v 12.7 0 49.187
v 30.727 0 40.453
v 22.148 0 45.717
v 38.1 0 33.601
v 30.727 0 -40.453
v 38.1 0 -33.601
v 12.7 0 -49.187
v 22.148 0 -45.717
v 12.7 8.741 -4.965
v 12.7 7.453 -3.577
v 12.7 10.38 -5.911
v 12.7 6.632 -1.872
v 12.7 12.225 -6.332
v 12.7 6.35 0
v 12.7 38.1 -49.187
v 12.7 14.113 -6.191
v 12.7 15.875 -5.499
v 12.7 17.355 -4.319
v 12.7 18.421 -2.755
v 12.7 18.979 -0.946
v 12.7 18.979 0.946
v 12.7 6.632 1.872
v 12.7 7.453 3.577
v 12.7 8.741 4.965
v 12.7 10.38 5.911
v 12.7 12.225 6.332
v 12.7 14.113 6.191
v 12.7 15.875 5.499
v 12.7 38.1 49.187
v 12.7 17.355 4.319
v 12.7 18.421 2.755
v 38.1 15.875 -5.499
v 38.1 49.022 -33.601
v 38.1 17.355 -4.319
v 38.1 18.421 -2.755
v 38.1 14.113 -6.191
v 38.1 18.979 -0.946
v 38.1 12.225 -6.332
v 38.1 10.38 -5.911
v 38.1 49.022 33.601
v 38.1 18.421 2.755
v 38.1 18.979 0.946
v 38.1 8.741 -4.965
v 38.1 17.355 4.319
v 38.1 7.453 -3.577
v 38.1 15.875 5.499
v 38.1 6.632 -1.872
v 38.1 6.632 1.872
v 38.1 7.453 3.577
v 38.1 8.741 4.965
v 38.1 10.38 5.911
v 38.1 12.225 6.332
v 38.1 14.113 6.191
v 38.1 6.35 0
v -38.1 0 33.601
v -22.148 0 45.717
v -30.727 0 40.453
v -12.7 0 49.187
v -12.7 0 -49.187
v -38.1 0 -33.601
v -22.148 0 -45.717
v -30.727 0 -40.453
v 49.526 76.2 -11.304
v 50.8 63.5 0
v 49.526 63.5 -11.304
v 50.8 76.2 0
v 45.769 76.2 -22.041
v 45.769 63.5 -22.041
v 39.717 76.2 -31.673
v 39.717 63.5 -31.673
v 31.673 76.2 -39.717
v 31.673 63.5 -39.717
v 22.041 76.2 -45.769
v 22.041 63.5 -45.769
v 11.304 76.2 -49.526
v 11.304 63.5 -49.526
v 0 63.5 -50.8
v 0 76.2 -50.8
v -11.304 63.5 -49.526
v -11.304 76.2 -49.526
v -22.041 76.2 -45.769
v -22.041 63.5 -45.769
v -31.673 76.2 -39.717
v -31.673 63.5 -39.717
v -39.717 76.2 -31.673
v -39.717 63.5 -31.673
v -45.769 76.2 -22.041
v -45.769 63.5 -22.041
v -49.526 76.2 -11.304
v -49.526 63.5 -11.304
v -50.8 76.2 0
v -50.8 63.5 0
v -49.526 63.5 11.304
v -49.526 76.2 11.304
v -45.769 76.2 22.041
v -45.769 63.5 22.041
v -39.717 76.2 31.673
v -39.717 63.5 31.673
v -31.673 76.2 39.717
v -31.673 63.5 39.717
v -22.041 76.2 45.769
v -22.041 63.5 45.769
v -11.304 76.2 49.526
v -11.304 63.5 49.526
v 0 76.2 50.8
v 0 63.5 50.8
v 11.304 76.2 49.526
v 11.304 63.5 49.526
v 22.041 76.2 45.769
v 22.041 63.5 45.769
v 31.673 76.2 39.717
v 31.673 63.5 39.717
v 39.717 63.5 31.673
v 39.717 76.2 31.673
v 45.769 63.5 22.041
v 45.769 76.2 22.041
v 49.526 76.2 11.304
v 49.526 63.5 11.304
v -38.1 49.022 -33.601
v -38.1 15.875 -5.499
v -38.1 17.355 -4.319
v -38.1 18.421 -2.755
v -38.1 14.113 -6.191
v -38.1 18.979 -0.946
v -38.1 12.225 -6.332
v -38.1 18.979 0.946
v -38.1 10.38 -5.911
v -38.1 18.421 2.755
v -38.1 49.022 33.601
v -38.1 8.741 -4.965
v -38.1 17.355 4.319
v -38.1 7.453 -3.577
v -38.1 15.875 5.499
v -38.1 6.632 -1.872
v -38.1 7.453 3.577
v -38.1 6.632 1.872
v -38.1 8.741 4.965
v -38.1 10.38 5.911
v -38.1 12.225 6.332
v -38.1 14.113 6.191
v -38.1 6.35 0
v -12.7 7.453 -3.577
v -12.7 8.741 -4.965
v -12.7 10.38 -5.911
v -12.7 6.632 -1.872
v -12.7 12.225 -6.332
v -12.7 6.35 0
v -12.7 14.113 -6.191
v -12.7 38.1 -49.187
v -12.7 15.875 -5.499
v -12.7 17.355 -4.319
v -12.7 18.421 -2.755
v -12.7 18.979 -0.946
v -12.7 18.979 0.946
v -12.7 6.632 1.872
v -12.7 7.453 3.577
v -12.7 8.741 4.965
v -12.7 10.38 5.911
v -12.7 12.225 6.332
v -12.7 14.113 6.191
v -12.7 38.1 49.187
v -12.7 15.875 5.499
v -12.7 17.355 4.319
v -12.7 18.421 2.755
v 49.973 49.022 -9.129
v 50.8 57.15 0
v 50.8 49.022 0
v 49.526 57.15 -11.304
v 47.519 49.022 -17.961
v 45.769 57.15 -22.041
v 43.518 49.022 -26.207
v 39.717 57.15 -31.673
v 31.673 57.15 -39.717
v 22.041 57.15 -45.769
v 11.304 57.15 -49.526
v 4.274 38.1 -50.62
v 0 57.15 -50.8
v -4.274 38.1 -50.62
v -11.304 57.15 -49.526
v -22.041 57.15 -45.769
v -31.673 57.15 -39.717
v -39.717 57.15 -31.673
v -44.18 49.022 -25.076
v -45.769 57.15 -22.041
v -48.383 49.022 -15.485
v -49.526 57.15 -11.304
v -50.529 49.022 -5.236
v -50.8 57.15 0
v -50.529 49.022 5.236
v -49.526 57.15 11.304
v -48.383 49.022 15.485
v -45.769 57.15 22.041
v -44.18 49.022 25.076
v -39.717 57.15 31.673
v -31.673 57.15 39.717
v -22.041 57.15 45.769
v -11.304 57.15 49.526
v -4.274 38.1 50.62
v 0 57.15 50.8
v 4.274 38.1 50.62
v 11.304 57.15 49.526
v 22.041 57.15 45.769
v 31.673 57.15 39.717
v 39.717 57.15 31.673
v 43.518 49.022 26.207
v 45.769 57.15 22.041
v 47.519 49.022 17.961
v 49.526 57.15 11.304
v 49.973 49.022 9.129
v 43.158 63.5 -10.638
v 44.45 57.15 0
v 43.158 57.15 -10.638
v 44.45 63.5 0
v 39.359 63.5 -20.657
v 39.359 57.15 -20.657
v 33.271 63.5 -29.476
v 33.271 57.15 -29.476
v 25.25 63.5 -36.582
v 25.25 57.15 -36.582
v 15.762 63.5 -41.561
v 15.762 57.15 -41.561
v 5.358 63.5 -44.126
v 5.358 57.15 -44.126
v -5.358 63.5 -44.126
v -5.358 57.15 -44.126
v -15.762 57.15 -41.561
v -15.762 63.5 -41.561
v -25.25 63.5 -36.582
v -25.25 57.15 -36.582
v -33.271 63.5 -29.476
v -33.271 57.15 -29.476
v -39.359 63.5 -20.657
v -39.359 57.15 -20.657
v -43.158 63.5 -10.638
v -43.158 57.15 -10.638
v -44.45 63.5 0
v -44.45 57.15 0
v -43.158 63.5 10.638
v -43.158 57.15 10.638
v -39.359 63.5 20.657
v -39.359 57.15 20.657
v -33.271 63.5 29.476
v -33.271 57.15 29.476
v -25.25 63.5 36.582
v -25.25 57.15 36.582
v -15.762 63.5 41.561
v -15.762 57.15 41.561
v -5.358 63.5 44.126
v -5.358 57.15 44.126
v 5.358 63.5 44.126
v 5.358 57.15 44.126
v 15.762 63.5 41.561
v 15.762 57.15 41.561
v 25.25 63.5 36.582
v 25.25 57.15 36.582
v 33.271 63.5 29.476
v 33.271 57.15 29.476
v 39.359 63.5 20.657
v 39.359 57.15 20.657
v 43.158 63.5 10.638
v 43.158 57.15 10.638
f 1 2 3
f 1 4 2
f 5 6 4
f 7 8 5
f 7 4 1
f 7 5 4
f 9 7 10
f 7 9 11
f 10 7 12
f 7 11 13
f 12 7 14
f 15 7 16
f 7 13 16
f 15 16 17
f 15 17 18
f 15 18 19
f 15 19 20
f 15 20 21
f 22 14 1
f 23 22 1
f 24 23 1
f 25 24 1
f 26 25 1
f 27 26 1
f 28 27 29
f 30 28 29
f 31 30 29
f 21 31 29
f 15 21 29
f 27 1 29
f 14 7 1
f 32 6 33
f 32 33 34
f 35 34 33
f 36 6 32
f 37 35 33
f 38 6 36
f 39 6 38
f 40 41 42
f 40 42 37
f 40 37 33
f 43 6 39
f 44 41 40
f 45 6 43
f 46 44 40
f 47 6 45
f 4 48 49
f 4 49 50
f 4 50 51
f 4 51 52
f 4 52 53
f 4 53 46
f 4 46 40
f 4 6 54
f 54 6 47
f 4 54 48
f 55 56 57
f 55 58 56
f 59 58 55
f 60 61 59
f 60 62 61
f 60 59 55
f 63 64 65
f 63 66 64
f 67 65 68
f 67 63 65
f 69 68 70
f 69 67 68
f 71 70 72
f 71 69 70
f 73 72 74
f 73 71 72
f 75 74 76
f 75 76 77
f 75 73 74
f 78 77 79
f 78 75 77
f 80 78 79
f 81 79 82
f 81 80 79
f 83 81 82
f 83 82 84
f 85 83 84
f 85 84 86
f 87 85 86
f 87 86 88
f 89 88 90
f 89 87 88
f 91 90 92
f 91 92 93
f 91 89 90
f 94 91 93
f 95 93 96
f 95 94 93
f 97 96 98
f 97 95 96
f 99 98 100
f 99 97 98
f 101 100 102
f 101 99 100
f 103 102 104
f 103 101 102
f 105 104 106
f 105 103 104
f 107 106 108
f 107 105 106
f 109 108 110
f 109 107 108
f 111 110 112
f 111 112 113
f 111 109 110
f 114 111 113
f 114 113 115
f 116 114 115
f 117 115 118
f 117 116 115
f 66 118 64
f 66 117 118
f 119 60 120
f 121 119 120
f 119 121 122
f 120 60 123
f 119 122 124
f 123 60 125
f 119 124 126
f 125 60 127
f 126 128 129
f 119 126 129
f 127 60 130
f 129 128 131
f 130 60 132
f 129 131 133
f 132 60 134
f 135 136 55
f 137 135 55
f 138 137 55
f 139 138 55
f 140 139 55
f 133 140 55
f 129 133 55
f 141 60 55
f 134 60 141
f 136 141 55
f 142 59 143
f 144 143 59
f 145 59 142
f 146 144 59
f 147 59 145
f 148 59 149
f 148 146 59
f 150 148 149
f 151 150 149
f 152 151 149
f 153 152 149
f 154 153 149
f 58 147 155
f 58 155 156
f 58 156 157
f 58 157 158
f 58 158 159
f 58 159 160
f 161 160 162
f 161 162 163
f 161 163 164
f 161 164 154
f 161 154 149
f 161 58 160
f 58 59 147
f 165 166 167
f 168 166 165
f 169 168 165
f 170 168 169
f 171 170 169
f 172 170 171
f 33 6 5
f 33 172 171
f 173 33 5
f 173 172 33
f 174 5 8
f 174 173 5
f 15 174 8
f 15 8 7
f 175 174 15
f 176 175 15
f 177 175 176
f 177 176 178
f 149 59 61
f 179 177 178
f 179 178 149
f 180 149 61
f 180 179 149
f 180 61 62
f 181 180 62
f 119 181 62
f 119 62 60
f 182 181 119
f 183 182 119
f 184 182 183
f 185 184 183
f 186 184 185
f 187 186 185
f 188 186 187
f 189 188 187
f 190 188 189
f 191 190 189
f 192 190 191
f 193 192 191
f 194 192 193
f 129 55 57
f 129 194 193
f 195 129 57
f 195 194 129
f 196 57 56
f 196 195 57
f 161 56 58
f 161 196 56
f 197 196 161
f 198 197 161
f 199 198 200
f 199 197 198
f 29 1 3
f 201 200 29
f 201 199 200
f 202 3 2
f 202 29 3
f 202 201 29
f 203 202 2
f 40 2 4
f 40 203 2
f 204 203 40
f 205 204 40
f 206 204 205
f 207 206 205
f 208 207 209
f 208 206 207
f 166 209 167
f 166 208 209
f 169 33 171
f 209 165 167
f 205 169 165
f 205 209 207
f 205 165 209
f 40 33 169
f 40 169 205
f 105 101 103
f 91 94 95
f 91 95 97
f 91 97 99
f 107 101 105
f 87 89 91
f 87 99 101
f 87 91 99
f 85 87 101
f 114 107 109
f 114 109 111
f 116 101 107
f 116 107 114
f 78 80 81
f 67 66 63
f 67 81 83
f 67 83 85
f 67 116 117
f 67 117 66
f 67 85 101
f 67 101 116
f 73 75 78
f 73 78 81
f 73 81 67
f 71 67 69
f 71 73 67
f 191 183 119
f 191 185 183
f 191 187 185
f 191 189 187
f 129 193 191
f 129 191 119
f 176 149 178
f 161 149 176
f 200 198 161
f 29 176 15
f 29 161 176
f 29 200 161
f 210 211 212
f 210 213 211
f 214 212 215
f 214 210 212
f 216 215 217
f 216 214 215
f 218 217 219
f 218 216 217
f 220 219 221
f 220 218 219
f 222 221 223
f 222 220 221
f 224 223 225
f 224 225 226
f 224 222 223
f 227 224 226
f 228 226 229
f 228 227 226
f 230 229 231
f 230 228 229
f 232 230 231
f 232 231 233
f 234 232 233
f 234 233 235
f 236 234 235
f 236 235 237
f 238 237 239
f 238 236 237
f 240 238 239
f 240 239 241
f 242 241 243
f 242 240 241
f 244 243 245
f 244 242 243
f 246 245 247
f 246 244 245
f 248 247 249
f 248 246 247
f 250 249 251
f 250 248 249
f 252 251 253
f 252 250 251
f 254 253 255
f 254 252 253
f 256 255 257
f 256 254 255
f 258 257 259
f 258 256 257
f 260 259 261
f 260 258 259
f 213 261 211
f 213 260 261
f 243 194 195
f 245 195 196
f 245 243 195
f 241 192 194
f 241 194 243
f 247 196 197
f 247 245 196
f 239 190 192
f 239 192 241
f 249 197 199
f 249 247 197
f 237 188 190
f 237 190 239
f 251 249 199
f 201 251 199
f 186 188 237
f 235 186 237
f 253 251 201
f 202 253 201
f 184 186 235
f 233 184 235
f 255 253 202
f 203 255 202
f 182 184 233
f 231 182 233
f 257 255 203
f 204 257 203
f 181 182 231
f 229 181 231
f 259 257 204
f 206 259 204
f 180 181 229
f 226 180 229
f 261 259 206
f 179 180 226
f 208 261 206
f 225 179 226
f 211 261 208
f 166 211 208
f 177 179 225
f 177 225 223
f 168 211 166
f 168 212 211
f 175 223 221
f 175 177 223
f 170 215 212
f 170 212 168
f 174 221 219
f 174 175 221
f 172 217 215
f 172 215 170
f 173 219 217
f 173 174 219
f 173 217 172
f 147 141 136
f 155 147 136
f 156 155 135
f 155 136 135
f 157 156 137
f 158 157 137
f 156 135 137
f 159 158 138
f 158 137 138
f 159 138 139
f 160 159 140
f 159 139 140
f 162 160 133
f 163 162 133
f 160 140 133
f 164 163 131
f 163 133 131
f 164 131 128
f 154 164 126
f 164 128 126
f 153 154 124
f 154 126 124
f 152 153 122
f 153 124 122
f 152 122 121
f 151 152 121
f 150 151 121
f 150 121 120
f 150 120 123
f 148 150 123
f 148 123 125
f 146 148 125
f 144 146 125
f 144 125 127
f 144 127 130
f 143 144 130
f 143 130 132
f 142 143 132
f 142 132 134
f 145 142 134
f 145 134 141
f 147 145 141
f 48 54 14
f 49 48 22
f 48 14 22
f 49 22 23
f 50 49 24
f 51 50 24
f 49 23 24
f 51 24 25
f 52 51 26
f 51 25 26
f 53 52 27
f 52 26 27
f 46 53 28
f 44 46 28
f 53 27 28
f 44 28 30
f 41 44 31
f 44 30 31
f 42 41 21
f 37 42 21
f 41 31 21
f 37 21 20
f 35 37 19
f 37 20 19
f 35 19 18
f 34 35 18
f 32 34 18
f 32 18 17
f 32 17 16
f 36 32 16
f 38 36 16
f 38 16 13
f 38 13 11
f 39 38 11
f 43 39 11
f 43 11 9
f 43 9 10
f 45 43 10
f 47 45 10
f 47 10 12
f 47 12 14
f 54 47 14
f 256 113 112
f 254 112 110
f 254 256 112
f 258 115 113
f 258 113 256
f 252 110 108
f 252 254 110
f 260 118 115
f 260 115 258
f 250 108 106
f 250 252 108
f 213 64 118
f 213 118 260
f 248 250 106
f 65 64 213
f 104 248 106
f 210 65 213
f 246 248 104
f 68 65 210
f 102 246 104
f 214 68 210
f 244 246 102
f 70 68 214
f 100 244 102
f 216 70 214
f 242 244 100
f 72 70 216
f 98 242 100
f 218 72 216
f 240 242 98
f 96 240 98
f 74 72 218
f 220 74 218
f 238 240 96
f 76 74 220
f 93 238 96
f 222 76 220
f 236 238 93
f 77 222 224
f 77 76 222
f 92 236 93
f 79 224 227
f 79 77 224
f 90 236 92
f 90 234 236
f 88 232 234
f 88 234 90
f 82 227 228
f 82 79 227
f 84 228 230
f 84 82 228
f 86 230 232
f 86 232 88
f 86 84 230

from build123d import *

# Parameters (mm, degrees)
F2_W     = 25.4
F2_H     = 38.1
F3_DEPTH = 73.406
F4_W     = 50.8549439785
F4_H     = 94.5440666826
F4_W_2   = 38.6421700465
F4_H_2   = 83.6342661441
F5_DEPTH = 49.022
F6_R     = 6.35
F7_DEPTH = 140.462


with BuildPart() as f1:
    # F0 (on Top) → F1 (revolve)
    with BuildSketch(Plane.XY):
        Polygon((0, 76.2), (0, 0), (50.8, 0), (50.8, 57.15), (44.45, 57.15), (44.45, 63.5), (50.8, 63.5), (50.8, 76.2), align=None)
    revolve(axis=Axis((0, 40.4900377447, 0), (0, 1, 0)))

    # F2 (on Top) → F3 (cut, symmetric)
    with BuildSketch(Plane.XY):
        with Locations((0, 19.05)):
            Rectangle(F2_W, F2_H)
    extrude(amount=F3_DEPTH, both=True, mode=Mode.SUBTRACT)

    # F4 (on face) → F5 (cut)
    with BuildSketch(Plane.XZ):
        with Locations((-63.5274719893, 9.0622203734)):
            Rectangle(F4_W, F4_H)
        with Locations((57.4210850232, -1.1638980359)):
            Rectangle(F4_W_2, F4_H_2)
    extrude(amount=-F5_DEPTH, mode=Mode.SUBTRACT)

    # F6 (on face) → F7 (cut)
    with BuildSketch(Plane(origin=(-38.1, 0, 0), x_dir=(0, -1, 0), z_dir=(-1, 0, 0))):
        with Locations((-12.7, 0)):
            Circle(F6_R)
    extrude(amount=-F7_DEPTH, mode=Mode.SUBTRACT)


solid = f1.part
